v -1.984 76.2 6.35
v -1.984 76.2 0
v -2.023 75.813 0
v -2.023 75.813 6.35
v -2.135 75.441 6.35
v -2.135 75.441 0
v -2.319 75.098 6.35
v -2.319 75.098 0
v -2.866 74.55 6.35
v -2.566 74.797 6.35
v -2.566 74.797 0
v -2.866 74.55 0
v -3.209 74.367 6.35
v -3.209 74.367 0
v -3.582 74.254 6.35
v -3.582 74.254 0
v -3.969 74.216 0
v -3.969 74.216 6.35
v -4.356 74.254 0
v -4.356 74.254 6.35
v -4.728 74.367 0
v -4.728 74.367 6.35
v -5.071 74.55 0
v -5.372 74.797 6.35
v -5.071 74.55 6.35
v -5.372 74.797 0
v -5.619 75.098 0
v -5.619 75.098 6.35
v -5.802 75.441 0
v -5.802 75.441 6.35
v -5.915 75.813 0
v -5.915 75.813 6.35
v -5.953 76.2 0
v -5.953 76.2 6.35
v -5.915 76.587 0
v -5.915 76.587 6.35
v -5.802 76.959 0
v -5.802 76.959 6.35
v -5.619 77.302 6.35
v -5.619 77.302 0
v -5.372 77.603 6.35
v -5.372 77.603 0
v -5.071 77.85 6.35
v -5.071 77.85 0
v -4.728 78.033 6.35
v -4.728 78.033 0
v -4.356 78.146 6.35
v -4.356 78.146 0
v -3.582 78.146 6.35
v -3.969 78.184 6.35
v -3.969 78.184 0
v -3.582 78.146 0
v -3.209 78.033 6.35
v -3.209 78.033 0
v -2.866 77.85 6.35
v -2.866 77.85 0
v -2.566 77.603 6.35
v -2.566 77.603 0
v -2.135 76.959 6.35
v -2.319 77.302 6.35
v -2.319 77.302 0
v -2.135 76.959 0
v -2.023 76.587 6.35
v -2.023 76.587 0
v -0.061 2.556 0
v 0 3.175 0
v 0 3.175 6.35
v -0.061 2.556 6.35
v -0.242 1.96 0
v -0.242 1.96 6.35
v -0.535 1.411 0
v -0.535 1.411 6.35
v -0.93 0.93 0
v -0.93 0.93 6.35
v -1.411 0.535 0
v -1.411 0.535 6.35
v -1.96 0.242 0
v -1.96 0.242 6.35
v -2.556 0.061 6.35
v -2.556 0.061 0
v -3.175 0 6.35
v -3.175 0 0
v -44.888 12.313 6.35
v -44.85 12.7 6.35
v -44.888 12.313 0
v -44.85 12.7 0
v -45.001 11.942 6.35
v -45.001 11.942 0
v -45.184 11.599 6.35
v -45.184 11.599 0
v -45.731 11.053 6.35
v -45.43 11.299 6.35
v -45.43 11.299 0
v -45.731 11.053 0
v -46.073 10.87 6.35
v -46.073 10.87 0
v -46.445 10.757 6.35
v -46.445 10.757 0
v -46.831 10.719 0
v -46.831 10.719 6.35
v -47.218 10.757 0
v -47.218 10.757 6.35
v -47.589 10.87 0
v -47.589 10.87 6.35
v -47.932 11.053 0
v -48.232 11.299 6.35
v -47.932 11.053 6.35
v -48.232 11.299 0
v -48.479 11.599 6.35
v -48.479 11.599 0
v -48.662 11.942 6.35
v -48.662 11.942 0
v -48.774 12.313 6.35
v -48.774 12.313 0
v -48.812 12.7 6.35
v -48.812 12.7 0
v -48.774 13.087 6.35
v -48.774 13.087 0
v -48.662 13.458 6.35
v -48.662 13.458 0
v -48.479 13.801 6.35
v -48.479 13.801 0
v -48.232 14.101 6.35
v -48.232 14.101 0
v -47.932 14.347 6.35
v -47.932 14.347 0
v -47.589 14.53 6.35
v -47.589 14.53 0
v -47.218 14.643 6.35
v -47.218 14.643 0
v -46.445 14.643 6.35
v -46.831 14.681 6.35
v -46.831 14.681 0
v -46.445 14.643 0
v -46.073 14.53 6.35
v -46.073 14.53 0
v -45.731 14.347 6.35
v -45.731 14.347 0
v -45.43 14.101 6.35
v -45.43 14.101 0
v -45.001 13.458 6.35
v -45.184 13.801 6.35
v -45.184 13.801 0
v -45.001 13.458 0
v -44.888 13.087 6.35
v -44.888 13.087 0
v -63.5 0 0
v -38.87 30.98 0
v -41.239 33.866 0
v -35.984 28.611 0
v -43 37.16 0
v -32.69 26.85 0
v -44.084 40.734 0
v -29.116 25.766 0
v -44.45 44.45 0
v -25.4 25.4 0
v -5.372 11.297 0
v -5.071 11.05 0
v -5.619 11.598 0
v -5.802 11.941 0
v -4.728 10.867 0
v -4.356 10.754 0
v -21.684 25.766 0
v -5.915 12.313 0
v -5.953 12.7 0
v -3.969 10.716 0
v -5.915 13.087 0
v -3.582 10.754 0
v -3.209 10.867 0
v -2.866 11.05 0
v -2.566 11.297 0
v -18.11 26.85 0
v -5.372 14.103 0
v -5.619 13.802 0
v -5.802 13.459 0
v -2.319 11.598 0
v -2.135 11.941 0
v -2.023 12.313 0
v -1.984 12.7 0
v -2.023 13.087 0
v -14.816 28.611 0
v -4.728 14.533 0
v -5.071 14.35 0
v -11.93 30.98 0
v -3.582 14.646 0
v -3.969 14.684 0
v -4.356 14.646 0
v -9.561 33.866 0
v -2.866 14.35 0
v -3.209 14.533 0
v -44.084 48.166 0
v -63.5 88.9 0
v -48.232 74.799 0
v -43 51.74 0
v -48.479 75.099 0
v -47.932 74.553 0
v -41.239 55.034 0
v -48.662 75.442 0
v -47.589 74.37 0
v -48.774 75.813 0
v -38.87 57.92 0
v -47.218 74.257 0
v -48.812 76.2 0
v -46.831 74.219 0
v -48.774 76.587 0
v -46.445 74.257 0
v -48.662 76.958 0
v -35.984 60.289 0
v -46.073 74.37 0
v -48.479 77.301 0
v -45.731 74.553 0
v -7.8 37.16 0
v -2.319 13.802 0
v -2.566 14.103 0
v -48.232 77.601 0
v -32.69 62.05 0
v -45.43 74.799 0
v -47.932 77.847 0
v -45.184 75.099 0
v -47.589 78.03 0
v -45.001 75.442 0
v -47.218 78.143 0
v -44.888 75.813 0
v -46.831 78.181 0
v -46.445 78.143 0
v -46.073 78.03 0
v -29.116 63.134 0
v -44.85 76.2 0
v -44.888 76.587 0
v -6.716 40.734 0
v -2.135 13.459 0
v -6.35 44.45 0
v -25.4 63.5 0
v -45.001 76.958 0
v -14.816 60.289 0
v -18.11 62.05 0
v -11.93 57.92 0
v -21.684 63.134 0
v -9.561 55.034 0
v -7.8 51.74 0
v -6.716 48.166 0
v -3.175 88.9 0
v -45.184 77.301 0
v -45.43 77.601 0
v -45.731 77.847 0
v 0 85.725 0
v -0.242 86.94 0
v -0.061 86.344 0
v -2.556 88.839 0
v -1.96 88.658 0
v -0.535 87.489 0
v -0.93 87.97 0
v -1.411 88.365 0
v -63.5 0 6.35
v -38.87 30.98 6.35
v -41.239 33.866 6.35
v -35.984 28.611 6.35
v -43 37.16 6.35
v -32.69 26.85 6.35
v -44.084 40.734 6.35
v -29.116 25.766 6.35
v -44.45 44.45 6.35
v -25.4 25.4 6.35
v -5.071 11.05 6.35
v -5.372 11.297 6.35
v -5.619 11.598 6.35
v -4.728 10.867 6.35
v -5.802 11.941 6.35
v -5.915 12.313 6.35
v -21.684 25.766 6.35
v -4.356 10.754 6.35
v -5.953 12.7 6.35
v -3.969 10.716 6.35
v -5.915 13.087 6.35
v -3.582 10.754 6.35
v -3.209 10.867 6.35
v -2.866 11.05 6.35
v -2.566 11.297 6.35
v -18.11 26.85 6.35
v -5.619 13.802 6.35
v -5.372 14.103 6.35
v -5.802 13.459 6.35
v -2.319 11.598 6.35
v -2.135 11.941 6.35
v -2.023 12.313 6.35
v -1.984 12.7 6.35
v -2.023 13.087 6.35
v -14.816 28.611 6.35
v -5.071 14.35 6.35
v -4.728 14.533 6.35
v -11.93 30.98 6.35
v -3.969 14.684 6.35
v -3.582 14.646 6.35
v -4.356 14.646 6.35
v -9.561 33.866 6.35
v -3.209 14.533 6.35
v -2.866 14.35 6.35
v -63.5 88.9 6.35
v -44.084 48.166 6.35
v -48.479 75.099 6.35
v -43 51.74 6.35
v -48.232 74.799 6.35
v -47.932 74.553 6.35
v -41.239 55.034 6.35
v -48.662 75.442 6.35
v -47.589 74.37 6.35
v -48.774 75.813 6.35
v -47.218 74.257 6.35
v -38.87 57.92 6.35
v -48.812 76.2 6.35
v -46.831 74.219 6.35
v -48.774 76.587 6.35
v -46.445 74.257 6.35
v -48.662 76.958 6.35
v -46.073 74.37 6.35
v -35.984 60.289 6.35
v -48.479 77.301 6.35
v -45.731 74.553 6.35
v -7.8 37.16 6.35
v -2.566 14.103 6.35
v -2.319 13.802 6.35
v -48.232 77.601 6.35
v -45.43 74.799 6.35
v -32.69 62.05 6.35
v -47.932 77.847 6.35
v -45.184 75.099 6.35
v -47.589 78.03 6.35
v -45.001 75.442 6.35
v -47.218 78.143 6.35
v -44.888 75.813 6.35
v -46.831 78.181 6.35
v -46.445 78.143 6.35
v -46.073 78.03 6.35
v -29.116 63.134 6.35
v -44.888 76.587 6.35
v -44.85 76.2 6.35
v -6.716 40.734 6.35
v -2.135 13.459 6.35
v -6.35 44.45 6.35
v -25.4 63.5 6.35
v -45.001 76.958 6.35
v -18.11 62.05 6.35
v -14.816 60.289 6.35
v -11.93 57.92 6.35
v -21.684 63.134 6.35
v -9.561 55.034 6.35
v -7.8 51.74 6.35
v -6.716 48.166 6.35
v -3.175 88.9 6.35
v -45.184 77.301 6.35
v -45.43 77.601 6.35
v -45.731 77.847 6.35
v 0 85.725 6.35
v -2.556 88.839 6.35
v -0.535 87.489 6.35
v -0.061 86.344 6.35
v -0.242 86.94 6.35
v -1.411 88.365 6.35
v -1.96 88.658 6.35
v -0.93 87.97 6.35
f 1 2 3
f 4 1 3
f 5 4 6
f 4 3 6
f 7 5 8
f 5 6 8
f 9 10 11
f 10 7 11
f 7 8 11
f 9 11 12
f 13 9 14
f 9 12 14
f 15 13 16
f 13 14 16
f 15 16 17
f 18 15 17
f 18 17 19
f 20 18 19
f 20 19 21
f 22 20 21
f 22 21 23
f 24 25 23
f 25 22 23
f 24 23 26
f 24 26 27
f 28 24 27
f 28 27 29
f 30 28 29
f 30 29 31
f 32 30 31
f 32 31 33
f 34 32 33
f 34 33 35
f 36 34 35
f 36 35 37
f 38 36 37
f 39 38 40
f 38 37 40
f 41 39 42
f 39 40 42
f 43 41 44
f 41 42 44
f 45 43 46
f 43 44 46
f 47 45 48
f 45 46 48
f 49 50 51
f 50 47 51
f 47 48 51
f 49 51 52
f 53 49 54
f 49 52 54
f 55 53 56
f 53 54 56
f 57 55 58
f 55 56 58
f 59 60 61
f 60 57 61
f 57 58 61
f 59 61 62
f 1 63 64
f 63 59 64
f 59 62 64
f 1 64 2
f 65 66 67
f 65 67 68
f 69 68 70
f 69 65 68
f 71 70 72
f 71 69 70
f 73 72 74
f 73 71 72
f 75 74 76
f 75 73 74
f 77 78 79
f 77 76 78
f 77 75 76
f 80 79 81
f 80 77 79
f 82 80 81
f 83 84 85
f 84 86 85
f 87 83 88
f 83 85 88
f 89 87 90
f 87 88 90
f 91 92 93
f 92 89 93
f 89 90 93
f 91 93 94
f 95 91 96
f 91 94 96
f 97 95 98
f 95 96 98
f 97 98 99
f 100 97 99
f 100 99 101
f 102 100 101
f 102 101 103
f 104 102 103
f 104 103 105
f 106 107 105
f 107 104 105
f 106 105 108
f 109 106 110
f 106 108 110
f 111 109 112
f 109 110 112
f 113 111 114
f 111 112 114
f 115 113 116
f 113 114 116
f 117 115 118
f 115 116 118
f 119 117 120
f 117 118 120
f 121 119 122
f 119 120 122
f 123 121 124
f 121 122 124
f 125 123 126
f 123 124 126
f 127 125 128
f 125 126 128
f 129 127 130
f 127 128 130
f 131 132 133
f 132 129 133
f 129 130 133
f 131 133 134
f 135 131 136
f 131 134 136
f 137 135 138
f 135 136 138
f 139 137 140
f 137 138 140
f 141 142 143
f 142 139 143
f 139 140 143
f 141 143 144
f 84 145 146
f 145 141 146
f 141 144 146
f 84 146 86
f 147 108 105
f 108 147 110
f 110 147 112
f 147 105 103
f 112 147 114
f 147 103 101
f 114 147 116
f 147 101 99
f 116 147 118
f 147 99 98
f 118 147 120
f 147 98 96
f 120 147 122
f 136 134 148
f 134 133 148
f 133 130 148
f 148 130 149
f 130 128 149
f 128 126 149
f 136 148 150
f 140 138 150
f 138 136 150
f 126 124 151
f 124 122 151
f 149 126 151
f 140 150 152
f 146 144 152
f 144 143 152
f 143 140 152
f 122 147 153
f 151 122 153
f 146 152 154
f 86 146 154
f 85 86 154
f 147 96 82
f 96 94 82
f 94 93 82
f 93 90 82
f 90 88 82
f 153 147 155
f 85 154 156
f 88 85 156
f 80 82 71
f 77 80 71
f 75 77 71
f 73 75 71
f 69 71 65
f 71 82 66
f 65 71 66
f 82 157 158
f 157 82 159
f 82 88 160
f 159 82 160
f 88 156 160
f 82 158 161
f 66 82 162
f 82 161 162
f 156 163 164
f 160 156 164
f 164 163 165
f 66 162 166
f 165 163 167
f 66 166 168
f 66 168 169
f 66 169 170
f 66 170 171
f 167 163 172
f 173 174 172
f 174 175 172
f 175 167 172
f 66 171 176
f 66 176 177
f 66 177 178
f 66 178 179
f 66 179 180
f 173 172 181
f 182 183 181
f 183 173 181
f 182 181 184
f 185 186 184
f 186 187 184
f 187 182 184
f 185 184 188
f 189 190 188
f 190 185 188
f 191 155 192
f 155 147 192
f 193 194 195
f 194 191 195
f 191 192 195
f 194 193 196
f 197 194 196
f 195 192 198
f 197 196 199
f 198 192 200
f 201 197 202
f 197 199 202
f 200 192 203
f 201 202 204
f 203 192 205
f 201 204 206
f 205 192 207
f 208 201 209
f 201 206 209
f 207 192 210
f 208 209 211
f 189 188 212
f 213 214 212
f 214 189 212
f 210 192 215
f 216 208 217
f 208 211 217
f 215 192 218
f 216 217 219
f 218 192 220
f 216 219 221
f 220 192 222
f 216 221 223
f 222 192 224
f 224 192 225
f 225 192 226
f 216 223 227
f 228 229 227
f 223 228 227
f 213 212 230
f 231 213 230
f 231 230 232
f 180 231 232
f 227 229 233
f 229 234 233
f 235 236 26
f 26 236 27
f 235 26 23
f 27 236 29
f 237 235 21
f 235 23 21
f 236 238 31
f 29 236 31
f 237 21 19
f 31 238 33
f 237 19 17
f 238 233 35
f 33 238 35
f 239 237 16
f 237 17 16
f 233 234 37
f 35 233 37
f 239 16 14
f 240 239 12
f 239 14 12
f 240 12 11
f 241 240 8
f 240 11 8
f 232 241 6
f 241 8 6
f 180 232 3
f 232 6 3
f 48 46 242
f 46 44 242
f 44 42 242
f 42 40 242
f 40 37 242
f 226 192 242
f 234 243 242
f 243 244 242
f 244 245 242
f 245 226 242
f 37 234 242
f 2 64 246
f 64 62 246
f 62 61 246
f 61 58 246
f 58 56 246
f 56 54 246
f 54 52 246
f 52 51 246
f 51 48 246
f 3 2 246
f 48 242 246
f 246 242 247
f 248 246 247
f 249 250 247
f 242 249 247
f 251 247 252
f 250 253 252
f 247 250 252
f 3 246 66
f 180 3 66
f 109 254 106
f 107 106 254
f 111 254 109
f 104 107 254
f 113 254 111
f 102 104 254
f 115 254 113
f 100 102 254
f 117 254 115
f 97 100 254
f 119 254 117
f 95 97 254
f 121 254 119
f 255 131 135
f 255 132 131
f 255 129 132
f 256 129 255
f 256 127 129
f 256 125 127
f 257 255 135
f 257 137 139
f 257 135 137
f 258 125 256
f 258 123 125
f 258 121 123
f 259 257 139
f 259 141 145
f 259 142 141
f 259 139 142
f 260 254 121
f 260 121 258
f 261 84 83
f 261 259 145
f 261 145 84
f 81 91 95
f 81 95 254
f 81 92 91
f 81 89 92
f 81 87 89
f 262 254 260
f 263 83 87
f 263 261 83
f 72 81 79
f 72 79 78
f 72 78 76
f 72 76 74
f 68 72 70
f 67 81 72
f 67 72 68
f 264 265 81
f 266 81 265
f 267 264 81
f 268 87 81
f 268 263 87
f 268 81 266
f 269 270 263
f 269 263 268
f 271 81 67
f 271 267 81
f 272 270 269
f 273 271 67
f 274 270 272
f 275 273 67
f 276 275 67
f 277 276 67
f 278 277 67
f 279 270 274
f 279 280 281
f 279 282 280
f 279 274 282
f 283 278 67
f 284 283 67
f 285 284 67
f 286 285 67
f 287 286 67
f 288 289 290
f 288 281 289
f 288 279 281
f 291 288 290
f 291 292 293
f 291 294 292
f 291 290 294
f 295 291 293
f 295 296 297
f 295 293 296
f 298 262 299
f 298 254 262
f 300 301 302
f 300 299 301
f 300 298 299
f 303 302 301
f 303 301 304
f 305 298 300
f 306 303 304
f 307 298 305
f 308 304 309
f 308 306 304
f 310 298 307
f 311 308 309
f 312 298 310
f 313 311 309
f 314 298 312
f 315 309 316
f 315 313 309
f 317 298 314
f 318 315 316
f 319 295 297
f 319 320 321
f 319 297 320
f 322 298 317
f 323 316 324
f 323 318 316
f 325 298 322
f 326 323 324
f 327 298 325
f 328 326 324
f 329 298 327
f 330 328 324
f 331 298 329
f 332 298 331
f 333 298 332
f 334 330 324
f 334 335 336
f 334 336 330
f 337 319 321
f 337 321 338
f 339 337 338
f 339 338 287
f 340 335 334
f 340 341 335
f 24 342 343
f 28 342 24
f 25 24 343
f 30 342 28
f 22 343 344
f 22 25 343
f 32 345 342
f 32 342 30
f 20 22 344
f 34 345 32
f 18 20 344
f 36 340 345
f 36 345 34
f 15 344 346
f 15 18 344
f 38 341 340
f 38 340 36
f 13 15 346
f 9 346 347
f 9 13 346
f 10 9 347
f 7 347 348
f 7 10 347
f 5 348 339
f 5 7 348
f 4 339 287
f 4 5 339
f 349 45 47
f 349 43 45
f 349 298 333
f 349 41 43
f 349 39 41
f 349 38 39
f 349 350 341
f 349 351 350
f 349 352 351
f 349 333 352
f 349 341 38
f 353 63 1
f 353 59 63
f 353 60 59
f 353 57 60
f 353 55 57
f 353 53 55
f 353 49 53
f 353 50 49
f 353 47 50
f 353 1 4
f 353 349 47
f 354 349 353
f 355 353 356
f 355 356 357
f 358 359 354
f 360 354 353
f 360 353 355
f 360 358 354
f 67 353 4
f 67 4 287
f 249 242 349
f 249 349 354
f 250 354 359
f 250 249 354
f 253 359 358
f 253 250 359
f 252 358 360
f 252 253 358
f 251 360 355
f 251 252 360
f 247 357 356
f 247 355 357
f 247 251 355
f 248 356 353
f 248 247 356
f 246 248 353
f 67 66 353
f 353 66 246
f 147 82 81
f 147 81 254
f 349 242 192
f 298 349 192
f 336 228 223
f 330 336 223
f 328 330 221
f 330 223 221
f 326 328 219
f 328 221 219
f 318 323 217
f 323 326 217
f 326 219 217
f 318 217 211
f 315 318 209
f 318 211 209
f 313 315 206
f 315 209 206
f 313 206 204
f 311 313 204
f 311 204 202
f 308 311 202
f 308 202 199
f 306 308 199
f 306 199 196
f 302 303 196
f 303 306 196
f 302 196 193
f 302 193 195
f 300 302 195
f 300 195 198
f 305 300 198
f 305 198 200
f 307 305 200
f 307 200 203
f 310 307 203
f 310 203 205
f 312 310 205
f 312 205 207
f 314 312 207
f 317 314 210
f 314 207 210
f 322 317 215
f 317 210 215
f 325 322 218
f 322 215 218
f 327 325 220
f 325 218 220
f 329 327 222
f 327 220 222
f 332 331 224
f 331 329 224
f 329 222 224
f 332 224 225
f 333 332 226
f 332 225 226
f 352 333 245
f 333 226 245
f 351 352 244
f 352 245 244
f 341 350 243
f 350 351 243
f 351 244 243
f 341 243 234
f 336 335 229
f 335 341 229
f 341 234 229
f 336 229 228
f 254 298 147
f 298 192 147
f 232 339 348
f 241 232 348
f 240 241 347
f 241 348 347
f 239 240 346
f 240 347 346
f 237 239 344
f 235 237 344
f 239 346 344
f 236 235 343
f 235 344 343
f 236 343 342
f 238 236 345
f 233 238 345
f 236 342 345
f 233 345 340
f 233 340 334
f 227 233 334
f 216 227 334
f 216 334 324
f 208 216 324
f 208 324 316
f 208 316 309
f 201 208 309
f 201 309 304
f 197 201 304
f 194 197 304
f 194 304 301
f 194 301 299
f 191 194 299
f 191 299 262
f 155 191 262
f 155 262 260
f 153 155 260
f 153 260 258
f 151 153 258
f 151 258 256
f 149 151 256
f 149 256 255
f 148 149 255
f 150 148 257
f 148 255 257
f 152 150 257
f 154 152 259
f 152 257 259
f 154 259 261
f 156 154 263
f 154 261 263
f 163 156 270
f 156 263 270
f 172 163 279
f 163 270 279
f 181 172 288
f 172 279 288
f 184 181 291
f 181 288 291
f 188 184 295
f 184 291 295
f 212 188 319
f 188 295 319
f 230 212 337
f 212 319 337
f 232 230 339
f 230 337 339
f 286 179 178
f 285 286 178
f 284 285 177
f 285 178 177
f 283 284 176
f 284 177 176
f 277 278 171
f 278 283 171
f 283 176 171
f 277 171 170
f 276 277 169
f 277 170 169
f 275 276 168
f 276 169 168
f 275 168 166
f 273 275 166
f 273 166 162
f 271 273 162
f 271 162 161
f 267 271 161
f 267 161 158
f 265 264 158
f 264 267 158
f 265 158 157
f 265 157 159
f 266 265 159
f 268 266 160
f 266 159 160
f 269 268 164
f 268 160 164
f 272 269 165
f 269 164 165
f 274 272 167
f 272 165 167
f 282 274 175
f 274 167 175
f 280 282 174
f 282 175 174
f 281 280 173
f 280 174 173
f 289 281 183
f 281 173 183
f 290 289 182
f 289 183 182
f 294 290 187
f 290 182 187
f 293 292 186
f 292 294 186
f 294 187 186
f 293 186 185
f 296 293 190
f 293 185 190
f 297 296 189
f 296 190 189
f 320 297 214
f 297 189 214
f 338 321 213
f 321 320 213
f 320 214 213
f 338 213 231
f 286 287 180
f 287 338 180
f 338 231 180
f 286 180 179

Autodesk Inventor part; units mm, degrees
ref_plane "YZ Plane" through (0, 0, 0) normal (1, 0, 0) x (0, 1, 0)
ref_plane "XZ Plane" through (0, 0, 0) normal (0, 1, 0) x (-1, 0, 0)
ref_plane "XY Plane" through (0, 0, 0) normal (0, 0, 1) x (1, 0, 0)
sketch "Sketch1" plane through (0, 0, 0) normal (0, 0, 1) x (1, 0, 0)
  line L0 (-3.175, 0) -> (-63.5, 0)
  line L1 (0, 3.175) -> (0, 85.725)
  line L2 (-3.175, 88.9) -> (-63.5, 88.9)
  line L3 (-63.5, 88.9) -> (-63.5, 0)
  circle A0 centre (-3.9688, 76.2) radius 1.9844
  circle A1 centre (-3.9688, 12.7) radius 1.9844
  circle A2 centre (-46.8313, 12.7) radius 1.9812
  circle A3 centre (-46.8313, 76.2) radius 1.9812
  arc A4 (0, 85.725) -> (-3.175, 88.9) centre (-3.175, 85.725) ccw
  arc A5 (-3.175, 0) -> (0, 3.175) centre (-3.175, 3.175) ccw
  point P0 (0, 0)
  point P1 (0, 88.9)
  dimension "d0" = 63.5
  dimension "d1" = 88.9
  dimension "d2" = 3.9688
  dimension "d3" = 3.9688
  dimension "d4" = 3.9624
  dimension "d5" = 3.9624
  dimension "d6" = 12.7
  dimension "d7" = 12.7
  dimension "d8" = 12.7
  dimension "d9" = 3.9688
  dimension "d10" = 3.9688
  dimension "d11" = 16.6687
  dimension "d12" = 12.7
  dimension "d13" = 16.6687
  dimension "d19" = 3.175
extrude "Plate1" add sketch "Sketch1" along normal blind 6.35
sketch "Sketch2" plane through (0, 0, 6.35) normal (0, 0, 1) x (1, 0, 0)
  line L0 (0, 85.725) -> (0, 3.175) projected
  line L1 (-63.5, 88.9) -> (-3.175, 88.9) projected
  line L2 (0, 44.45) -> (-25.4, 44.45)
  circle A0 centre (-25.4, 44.45) radius 19.05
  point P0 (0, 0)
  point P1 (0, 88.9)
  dimension "d15" = 25.4
  dimension "d16" = 38.1
extrude "Cut1" cut sketch "Sketch2" against normal blind 6.35
equation "\"d17\" = Thickness"
equation "\"BendRadius\" = Thickness"
equation "\"BendReliefWidth\" = Thickness"
equation "\"BendReliefDepth\" = 0.5 * Thickness"
equation "\"CornerReliefSize\" = 4 * Thickness"
equation "\"MinimumRemnant\" = 2 * Thickness"
equation "\"TransitionRadius\" = BendRadius"
equation "\"JacobiRadiusSize\" = BendRadius"
equation "\"GapSize\" = Thickness"
equation "\"d14\" = BendRadius"
equation "\"Thickness\" = 6.35"
properties part number "bearing faceplate"
